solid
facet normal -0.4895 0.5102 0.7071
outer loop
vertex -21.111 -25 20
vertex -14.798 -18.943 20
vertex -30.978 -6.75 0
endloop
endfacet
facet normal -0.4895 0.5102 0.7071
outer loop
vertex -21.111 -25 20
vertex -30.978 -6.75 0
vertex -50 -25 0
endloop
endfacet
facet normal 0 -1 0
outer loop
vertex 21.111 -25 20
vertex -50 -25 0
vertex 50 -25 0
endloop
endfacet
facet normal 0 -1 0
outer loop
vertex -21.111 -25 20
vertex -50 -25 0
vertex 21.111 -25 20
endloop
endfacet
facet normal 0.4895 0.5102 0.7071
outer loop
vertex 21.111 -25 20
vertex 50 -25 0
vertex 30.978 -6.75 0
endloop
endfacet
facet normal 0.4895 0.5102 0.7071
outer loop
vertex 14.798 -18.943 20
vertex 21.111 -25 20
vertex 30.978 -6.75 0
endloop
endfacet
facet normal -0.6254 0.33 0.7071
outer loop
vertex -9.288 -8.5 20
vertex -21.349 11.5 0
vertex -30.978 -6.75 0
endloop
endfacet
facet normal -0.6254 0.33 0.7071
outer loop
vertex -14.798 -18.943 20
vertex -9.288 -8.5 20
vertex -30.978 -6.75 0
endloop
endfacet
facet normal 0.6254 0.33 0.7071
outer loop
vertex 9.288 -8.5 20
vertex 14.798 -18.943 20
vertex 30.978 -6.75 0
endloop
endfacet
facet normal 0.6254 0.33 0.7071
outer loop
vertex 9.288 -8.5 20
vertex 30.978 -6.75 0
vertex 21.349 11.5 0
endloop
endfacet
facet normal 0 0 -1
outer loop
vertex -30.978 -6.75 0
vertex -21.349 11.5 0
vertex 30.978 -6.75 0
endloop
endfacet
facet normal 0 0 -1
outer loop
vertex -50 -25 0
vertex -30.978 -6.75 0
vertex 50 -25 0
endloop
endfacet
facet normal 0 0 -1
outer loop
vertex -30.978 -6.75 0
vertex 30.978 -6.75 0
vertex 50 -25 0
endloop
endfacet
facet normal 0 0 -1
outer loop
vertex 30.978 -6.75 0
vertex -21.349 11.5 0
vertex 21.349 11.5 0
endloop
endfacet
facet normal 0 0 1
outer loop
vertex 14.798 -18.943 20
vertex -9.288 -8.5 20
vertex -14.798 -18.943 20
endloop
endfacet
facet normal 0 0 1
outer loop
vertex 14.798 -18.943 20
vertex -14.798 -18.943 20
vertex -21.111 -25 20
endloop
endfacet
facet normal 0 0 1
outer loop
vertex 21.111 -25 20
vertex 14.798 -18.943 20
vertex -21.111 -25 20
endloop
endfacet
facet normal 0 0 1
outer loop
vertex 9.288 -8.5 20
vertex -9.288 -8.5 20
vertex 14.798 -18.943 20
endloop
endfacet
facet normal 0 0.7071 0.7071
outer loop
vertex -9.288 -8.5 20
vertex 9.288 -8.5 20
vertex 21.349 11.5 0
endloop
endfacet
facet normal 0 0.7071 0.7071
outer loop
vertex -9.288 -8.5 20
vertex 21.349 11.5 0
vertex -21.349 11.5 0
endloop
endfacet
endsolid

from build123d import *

# Parameters (mm, degrees)
F1_DEPTH = 20
F2_SIZE  = 19.99999


# Not quite as in the source:
# - a fillet or chamfer is up to 0.001 mm smaller than in the source, because OpenCascade refuses the exact size


with BuildPart() as f1:
    # F0 (on Top) → F1 (new body)
    with BuildSketch(Plane.XY):
        Polygon((-30.9781403543, -6.75), (-50, -25), (50, -25), (30.9781403543, -6.75), (21.3486810742, 11.5), (-21.3486810742, 11.5), align=None)
    extrude(amount=F1_DEPTH)

    # F2 (size 20 in the source; OpenCascade refuses exactly that, so slightly less here)
    f2_edges = [f1.edges().sort_by_distance(p)[0] for p in [
        (0, 11.5, 20),
        (26.163411, 2.375, 20),
        (40.48907, -15.875, 20),
        (-40.48907, -15.875, 20),
        (-26.163411, 2.375, 20),
    ]]
    chamfer(f2_edges, length=F2_SIZE)


solid = f1.part
